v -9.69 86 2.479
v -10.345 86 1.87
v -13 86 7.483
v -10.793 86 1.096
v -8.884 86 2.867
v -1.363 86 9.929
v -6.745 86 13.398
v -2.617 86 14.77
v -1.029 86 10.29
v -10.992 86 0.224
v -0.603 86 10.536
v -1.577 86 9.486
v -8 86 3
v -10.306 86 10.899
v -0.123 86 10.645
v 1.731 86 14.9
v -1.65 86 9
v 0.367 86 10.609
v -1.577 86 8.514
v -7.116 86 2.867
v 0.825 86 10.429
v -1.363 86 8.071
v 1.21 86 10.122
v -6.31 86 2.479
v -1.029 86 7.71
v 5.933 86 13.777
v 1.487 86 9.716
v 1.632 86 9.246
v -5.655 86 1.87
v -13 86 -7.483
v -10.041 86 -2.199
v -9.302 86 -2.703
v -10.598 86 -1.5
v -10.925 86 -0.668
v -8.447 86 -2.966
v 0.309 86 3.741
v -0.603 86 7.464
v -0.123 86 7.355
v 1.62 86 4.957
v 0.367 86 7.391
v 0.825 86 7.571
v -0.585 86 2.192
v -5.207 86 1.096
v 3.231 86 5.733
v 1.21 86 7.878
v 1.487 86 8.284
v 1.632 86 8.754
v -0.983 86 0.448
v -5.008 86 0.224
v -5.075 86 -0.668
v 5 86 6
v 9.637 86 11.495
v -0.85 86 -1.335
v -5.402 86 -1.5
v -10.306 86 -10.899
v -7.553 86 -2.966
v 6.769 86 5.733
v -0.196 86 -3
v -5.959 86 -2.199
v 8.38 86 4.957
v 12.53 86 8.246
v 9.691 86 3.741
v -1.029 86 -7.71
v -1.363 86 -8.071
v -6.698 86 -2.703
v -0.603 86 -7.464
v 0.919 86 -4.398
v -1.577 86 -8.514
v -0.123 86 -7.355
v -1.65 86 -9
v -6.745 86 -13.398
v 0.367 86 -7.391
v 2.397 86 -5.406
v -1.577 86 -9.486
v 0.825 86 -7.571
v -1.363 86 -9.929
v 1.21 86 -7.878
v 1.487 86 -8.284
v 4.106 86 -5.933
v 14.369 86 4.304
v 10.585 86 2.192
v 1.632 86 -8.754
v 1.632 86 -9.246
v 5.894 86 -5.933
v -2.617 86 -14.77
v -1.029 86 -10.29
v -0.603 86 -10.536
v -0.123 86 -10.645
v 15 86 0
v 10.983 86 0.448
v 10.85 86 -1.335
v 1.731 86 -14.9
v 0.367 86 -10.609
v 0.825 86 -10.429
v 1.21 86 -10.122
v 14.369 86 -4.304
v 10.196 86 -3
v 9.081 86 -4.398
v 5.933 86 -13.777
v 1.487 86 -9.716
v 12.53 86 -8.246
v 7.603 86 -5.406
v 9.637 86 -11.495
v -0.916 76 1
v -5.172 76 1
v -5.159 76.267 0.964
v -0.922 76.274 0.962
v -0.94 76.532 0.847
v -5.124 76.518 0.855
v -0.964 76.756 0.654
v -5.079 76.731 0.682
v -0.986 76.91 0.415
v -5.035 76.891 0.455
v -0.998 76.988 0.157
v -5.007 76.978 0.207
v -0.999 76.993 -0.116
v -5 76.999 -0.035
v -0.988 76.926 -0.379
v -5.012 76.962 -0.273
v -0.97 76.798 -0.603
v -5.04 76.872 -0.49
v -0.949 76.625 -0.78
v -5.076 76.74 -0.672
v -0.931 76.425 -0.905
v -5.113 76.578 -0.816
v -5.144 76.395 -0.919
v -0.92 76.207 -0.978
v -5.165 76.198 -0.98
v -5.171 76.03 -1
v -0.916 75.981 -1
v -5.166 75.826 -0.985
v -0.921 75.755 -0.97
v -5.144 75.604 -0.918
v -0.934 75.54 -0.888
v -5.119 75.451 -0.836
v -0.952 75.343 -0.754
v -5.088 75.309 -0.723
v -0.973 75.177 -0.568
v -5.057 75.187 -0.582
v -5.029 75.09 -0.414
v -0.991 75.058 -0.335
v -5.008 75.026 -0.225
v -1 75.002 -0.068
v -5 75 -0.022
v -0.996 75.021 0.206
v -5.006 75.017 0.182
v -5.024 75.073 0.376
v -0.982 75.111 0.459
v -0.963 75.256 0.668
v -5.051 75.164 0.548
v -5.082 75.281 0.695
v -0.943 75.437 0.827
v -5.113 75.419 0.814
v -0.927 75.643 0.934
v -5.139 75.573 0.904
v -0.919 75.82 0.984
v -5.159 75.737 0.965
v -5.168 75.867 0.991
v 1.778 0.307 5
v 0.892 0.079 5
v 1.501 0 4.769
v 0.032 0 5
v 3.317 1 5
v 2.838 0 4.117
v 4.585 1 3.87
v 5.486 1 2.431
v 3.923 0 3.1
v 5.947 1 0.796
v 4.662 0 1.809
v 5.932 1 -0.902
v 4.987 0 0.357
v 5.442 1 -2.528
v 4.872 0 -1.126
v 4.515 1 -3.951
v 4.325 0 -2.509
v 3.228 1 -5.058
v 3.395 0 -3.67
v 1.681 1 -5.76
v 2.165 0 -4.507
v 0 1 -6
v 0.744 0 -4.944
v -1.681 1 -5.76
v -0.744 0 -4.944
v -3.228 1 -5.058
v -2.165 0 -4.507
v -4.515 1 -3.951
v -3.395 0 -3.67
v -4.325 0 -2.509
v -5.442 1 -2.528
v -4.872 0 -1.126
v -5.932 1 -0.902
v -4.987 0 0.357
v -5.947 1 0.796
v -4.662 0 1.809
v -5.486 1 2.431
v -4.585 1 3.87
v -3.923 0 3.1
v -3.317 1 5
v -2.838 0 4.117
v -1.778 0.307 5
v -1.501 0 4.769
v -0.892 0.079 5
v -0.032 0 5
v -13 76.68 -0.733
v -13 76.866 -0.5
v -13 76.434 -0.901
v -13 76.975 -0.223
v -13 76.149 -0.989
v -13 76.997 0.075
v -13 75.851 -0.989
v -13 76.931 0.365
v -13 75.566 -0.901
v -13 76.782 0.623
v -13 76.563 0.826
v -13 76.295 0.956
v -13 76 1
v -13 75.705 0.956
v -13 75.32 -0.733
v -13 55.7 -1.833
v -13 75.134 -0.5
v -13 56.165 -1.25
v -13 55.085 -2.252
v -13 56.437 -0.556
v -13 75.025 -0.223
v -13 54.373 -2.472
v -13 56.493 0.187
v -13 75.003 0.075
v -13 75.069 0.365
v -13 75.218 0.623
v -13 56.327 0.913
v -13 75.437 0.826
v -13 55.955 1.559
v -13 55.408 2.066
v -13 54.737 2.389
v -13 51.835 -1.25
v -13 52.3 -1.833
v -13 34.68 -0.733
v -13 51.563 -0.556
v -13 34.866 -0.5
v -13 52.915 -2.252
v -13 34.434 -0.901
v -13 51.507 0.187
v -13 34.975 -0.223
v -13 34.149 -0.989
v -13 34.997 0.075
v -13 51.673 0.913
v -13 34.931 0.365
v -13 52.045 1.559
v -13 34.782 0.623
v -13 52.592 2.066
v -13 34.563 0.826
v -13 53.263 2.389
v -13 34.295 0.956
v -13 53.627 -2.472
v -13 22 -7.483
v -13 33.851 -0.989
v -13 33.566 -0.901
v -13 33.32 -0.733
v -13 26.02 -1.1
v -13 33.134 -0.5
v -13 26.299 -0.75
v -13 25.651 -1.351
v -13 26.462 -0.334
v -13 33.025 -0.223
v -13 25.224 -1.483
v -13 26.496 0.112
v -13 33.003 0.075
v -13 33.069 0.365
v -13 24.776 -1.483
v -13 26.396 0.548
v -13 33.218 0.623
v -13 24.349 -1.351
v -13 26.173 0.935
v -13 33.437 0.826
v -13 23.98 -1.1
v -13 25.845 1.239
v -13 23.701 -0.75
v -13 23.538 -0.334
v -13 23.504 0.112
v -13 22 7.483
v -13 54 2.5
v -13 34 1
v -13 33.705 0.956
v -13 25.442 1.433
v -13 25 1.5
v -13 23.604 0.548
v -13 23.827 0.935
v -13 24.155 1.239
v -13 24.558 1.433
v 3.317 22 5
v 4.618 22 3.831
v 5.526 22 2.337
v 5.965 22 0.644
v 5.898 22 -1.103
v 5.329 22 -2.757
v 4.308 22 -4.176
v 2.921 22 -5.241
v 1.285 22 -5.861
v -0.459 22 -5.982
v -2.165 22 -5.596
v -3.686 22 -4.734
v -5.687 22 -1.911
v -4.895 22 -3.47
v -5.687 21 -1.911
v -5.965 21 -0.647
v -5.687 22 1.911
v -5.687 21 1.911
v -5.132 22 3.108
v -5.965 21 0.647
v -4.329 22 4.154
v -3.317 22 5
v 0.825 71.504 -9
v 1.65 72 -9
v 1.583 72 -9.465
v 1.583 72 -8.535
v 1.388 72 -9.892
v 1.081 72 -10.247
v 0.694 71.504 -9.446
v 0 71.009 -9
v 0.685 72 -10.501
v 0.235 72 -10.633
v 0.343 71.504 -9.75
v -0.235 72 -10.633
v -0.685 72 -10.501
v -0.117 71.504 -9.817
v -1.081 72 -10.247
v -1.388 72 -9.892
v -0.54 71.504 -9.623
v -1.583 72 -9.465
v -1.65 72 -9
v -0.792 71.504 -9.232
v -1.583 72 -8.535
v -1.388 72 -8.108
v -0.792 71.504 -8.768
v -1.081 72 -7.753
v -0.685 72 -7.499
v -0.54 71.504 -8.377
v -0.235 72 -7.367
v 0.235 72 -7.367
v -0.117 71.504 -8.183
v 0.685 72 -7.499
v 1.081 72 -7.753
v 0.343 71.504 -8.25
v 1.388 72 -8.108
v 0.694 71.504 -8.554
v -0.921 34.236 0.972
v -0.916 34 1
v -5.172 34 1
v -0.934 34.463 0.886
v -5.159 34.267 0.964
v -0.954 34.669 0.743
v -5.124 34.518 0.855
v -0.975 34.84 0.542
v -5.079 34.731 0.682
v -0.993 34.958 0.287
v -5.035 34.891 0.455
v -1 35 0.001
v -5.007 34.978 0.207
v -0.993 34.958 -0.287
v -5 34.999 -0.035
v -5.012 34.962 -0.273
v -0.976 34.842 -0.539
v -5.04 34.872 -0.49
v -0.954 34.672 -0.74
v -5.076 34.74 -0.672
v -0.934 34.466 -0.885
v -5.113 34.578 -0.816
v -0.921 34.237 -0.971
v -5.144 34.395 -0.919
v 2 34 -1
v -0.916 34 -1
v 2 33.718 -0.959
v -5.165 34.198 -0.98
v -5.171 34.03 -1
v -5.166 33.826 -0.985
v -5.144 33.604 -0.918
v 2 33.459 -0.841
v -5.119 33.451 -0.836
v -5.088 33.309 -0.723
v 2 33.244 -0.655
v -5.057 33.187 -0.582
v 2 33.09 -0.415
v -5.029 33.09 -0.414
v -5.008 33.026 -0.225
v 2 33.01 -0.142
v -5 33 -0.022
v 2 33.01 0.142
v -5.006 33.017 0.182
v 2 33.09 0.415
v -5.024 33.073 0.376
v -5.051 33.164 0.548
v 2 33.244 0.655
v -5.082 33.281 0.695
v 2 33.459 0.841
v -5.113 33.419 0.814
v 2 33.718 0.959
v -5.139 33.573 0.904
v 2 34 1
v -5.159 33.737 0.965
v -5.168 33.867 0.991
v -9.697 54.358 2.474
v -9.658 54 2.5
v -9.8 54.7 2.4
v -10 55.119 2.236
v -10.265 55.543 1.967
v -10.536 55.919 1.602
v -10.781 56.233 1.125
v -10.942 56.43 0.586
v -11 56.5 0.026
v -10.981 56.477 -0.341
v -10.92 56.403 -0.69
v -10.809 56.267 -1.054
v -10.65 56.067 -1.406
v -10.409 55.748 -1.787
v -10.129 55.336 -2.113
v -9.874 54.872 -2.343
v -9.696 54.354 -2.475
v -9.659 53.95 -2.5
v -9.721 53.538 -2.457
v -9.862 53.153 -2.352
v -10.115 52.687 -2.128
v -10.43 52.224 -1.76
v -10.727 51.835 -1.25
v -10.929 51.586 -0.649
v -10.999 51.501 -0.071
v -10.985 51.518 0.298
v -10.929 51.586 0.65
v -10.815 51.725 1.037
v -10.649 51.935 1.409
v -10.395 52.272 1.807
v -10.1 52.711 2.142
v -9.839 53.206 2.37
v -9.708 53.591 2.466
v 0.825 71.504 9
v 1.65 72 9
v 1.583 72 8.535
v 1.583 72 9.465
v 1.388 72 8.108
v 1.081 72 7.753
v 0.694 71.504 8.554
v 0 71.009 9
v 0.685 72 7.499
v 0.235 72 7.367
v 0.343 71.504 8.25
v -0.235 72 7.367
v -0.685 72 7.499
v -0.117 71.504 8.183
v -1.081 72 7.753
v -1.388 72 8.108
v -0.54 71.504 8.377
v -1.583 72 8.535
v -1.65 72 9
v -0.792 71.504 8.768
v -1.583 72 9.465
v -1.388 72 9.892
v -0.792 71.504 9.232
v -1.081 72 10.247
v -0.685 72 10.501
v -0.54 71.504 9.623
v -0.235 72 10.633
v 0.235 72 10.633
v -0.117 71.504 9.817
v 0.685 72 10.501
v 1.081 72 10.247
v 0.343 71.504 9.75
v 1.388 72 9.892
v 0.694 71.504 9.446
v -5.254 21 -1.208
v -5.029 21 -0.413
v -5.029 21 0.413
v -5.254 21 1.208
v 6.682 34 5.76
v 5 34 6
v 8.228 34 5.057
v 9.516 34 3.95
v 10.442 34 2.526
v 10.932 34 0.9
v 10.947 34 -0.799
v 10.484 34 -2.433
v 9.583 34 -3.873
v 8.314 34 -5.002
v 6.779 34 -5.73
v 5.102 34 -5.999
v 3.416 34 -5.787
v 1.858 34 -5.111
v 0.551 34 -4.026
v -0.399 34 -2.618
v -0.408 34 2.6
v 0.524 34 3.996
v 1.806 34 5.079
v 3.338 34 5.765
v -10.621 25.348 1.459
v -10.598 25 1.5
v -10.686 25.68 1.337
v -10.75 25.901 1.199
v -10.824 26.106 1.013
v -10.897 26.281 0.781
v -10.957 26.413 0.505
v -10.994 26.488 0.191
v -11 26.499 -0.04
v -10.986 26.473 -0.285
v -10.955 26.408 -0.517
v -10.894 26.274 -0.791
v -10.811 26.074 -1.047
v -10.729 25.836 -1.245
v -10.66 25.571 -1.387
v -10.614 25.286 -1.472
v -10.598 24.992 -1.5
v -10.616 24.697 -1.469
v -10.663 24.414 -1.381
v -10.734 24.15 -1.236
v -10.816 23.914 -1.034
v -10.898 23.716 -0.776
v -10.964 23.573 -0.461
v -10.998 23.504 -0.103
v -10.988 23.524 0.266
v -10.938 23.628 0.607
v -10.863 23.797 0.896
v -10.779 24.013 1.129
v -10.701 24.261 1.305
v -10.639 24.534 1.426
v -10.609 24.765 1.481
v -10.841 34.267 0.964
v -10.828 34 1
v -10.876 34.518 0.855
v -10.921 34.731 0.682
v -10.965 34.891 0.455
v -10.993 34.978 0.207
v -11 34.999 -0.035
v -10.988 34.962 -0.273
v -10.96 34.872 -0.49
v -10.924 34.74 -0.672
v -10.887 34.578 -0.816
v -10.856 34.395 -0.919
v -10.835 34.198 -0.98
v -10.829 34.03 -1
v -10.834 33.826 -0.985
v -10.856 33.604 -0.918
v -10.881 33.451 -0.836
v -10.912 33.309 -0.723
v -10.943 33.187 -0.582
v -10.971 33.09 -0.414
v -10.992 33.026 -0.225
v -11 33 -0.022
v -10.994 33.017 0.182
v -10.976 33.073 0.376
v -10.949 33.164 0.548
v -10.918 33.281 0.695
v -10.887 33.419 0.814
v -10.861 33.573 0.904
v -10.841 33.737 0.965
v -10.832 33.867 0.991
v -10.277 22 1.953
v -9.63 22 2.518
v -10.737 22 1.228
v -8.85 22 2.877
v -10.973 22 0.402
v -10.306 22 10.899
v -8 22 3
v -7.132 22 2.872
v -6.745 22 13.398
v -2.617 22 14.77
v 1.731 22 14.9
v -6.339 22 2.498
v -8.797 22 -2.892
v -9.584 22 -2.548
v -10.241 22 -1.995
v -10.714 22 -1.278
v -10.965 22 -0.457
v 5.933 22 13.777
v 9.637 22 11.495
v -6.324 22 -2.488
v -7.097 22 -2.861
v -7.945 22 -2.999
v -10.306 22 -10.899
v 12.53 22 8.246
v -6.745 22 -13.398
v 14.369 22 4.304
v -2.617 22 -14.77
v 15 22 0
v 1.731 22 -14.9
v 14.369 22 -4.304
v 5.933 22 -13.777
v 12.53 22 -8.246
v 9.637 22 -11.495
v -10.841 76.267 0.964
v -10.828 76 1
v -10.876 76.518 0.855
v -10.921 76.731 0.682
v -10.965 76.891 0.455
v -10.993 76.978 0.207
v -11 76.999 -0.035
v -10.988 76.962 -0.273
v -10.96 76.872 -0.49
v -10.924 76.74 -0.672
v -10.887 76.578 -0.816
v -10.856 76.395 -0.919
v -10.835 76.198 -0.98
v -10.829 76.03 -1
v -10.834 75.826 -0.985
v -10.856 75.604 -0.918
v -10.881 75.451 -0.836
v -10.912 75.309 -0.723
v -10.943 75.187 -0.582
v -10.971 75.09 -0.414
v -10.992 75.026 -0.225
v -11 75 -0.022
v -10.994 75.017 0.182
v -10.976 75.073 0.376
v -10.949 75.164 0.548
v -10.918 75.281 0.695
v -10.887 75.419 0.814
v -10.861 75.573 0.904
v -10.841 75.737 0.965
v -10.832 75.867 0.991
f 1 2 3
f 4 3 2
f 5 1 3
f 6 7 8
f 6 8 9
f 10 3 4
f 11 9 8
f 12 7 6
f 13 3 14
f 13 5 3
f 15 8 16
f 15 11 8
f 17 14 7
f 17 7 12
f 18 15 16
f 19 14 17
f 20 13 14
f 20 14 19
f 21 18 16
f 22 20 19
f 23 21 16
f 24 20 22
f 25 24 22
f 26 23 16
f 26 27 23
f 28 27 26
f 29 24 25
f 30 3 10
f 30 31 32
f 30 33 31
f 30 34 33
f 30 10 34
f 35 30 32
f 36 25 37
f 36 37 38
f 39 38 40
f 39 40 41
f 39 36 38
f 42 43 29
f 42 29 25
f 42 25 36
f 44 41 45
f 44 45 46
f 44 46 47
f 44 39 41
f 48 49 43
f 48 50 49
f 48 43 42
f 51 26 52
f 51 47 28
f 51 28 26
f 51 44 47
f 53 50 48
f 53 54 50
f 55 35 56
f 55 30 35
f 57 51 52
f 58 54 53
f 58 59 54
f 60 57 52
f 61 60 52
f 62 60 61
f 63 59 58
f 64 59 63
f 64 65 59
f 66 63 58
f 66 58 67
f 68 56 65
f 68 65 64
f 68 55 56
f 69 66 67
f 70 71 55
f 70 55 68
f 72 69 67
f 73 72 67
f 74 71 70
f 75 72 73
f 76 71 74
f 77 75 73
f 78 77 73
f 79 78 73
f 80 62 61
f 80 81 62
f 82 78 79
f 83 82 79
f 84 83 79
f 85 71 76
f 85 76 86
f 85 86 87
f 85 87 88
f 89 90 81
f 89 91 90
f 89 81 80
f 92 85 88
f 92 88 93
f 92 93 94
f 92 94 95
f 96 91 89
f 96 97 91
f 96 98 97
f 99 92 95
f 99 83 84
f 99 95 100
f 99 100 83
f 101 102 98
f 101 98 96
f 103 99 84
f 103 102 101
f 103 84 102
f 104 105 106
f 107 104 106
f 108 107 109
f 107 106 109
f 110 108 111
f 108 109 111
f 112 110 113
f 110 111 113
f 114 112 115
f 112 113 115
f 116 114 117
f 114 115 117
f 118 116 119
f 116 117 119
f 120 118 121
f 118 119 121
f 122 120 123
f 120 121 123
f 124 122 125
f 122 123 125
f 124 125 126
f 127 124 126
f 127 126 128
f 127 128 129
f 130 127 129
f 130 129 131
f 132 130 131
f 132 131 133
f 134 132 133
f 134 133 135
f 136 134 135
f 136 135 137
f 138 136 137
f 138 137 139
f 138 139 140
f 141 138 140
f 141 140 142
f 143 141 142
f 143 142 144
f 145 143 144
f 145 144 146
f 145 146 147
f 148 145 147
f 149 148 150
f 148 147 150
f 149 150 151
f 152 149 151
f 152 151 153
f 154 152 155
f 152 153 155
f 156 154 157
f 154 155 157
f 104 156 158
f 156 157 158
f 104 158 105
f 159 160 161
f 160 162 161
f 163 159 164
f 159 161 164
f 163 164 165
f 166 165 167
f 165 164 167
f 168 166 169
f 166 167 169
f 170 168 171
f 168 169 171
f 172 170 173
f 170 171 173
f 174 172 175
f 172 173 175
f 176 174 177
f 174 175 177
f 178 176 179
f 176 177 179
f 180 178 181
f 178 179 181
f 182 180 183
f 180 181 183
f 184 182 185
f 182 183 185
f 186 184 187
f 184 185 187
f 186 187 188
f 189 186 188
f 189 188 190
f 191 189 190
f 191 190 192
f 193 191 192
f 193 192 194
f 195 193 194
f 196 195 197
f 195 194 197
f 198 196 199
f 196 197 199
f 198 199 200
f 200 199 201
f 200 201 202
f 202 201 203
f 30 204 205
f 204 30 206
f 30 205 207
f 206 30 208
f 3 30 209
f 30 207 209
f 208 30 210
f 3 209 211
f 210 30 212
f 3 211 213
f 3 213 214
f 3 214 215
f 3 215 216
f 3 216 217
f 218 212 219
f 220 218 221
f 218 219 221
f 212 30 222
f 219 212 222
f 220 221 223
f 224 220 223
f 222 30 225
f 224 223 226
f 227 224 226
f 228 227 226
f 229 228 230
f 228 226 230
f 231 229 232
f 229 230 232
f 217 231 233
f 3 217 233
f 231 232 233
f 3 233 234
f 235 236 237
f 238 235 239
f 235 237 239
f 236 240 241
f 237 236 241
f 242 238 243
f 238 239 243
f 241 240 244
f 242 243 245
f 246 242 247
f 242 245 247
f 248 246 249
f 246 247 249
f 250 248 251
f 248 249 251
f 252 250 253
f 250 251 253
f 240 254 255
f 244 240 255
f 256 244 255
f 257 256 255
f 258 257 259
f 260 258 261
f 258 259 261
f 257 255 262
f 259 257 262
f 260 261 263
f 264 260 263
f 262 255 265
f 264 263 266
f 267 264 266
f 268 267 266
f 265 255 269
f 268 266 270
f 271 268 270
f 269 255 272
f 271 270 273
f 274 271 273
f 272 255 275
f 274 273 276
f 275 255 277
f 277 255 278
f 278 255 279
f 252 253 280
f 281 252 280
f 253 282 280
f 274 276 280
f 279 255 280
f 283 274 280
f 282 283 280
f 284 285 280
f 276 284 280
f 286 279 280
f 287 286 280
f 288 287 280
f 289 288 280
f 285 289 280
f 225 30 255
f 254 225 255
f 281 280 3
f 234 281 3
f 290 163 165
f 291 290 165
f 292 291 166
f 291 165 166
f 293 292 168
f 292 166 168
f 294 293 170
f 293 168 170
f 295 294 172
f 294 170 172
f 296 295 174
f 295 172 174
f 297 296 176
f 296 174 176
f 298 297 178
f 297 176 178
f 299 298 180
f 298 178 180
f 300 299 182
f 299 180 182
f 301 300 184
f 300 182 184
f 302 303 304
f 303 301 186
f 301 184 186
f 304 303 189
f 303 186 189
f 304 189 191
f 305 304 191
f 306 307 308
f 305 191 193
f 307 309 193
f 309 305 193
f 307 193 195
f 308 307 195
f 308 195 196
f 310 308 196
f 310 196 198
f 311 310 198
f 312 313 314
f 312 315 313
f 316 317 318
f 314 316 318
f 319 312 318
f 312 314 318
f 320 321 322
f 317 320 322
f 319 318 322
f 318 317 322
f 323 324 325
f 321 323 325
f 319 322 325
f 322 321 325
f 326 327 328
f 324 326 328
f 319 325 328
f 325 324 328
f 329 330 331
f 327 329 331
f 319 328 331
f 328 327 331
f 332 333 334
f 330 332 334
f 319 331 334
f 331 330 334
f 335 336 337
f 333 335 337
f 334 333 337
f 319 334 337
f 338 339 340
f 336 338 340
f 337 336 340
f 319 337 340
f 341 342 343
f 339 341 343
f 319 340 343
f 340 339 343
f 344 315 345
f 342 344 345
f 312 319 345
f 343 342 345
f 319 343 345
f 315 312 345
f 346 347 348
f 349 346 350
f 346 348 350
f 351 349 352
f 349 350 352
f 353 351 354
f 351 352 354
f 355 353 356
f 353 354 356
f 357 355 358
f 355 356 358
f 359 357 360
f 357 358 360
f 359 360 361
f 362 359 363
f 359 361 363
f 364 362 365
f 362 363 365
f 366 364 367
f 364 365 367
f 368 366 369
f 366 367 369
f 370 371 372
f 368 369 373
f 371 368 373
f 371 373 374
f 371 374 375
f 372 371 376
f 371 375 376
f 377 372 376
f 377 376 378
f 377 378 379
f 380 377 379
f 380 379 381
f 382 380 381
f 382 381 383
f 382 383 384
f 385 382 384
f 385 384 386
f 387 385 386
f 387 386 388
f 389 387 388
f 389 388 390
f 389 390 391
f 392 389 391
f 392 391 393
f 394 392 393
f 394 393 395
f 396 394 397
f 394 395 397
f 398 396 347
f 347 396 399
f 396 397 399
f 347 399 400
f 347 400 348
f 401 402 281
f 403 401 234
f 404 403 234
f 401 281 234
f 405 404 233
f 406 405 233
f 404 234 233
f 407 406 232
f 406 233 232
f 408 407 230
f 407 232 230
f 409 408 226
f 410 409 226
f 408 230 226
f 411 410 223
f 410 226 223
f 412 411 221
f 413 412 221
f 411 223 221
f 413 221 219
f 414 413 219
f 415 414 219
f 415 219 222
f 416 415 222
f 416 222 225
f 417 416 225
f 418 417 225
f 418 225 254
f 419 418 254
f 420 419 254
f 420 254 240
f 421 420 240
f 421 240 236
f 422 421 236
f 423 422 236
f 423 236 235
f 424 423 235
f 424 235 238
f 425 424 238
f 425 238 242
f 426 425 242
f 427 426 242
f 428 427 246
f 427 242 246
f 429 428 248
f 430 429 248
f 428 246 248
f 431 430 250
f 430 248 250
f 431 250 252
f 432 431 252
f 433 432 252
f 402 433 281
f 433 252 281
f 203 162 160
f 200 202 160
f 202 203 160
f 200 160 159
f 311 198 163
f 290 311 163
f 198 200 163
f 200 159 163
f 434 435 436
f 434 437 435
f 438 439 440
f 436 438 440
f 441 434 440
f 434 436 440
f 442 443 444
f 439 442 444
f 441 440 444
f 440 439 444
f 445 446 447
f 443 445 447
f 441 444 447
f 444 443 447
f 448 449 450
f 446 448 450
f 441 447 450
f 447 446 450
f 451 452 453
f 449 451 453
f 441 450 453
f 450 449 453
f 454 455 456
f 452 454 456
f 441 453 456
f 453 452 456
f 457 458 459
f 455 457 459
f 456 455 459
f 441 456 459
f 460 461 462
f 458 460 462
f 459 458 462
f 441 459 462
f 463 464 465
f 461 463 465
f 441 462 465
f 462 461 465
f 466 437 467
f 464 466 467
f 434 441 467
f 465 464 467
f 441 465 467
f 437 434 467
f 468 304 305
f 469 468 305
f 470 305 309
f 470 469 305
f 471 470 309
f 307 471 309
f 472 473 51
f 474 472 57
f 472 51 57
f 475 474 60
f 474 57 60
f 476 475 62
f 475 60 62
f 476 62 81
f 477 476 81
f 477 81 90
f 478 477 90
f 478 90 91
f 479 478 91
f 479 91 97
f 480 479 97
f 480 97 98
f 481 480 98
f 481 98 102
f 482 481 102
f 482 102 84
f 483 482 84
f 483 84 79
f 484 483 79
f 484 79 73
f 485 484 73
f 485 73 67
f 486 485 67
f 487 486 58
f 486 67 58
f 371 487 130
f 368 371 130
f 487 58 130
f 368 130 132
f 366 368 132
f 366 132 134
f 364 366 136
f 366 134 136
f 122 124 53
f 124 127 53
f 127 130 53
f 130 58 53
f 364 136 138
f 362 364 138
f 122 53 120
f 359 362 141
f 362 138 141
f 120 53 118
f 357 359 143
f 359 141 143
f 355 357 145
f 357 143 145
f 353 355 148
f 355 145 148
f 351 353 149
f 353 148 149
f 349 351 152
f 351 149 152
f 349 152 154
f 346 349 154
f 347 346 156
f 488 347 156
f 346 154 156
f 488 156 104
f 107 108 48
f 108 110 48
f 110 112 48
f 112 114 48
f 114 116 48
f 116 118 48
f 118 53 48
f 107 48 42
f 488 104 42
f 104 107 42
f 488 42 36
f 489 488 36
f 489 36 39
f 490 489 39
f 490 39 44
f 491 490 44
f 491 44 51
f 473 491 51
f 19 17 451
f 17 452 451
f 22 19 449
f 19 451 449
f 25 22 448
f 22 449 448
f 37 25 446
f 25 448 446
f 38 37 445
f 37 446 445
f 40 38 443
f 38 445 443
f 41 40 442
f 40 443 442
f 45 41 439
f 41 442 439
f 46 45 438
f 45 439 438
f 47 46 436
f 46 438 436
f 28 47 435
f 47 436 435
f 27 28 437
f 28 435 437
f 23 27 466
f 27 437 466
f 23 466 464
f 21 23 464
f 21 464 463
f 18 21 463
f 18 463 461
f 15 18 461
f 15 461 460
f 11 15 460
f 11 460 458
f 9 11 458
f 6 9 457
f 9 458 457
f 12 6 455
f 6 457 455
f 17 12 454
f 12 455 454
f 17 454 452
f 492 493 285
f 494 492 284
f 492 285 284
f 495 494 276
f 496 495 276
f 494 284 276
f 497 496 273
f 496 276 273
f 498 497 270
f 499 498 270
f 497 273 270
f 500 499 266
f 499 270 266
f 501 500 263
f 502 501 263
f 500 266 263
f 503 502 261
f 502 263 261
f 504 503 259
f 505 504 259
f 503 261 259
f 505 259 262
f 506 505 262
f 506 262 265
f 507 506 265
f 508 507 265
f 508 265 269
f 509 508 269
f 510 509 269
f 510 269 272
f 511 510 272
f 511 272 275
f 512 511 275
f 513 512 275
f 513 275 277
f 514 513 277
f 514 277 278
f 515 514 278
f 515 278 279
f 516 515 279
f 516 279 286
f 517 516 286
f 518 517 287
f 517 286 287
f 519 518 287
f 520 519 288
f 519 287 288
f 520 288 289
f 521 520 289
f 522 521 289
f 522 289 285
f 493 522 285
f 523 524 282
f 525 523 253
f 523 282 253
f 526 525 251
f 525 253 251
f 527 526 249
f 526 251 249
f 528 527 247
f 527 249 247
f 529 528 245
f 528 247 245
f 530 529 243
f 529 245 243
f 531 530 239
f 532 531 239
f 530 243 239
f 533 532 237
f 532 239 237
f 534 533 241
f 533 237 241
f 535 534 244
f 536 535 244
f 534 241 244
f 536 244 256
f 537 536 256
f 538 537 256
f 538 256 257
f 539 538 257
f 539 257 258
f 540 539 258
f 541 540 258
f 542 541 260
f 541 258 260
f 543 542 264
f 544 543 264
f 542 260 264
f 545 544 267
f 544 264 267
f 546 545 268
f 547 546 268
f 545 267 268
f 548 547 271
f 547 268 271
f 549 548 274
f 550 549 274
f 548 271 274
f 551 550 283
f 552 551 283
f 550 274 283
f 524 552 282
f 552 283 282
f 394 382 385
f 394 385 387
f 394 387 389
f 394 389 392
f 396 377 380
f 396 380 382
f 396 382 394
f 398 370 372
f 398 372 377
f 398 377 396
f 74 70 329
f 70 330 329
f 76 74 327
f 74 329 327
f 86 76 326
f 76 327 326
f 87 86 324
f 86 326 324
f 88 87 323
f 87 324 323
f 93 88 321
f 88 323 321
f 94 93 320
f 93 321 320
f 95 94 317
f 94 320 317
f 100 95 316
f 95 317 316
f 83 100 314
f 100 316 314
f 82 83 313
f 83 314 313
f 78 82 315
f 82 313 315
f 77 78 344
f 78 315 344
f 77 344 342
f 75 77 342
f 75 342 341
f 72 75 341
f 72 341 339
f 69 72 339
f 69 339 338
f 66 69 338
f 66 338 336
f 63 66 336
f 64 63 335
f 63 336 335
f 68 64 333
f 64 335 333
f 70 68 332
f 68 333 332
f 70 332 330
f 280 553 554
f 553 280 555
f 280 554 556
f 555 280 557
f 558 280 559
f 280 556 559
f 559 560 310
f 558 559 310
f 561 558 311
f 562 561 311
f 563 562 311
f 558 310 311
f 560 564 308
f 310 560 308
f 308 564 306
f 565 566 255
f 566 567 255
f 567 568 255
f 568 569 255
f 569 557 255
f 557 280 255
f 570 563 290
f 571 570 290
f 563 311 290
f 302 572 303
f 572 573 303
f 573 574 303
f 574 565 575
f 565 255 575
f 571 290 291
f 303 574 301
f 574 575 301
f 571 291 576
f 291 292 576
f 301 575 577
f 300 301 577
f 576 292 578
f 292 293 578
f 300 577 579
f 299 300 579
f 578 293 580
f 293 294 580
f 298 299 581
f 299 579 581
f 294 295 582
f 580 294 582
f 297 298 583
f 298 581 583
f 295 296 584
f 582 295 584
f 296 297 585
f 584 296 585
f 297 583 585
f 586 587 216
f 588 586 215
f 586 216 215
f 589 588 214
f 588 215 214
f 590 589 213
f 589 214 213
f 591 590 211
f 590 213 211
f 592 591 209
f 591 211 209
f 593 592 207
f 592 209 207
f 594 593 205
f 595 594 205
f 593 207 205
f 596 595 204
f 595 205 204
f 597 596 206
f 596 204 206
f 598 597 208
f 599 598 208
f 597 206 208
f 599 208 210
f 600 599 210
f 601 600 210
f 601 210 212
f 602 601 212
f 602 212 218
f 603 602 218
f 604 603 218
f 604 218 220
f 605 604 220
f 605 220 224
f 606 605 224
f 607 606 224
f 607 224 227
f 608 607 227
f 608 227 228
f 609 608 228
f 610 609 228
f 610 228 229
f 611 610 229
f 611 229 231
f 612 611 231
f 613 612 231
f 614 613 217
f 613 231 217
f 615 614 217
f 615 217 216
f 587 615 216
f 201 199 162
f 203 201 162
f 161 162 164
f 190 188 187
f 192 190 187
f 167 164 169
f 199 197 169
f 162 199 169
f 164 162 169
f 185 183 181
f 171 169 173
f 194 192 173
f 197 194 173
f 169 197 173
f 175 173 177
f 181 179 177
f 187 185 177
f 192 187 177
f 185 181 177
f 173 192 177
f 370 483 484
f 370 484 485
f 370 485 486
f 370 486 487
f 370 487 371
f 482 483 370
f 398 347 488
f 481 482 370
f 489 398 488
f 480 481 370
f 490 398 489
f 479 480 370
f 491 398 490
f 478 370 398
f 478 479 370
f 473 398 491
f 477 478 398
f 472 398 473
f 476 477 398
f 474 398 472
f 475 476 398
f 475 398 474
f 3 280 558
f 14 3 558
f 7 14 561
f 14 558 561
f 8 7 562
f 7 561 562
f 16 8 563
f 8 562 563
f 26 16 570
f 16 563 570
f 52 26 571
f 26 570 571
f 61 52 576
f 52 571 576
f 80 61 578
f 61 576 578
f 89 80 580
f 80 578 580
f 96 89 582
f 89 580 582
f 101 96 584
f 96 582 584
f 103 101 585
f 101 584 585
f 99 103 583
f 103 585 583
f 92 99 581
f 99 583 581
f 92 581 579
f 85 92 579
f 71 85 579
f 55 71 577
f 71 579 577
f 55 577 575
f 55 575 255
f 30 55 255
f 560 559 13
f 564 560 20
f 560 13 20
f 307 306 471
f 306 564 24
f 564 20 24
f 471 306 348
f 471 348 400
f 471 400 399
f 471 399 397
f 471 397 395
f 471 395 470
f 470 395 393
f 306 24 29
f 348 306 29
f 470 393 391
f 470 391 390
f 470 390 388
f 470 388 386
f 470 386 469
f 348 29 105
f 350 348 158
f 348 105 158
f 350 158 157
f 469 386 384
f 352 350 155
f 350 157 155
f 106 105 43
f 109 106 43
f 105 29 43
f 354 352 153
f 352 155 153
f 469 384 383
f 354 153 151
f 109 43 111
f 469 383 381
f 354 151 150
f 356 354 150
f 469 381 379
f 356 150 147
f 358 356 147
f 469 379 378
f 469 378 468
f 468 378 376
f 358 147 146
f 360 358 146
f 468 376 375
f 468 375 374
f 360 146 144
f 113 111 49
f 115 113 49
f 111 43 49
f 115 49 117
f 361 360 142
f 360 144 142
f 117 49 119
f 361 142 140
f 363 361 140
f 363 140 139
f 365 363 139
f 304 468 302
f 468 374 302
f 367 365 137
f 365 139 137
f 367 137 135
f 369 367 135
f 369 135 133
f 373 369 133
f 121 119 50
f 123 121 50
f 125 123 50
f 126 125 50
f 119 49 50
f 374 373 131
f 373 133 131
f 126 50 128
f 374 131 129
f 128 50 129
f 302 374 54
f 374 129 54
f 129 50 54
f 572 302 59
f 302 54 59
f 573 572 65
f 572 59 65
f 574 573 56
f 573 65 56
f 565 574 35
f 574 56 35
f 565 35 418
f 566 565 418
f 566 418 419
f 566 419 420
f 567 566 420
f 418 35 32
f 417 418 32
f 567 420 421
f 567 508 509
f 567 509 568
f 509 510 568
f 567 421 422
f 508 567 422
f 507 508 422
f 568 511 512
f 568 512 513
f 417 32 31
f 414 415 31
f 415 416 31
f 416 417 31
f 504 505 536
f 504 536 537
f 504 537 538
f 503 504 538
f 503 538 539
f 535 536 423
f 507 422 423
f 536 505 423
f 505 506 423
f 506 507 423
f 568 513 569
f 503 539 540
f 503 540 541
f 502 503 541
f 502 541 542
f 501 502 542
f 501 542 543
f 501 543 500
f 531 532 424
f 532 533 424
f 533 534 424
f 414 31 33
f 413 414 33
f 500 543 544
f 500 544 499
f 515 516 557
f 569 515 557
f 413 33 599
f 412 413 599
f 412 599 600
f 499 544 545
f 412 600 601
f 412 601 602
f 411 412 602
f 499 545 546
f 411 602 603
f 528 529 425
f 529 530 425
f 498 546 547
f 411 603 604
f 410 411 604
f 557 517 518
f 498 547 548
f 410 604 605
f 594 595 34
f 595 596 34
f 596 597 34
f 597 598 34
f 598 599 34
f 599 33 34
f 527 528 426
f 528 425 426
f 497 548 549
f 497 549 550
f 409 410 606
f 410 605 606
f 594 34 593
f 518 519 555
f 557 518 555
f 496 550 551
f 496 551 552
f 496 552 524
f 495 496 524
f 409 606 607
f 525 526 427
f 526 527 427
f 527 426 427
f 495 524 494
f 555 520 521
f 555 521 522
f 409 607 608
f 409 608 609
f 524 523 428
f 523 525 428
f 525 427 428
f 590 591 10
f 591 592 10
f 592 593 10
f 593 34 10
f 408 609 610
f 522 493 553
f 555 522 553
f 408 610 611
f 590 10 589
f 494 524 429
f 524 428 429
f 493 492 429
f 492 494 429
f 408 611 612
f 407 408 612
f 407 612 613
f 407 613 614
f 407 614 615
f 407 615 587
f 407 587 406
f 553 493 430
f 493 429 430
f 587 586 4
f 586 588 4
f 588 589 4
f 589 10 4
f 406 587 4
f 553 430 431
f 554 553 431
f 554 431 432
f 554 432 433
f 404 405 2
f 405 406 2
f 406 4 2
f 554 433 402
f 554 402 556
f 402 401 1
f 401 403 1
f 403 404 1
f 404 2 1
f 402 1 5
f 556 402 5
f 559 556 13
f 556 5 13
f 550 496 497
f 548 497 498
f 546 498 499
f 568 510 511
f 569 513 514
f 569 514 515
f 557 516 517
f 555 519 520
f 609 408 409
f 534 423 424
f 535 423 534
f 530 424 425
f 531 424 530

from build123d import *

# Parameters (mm, degrees)
BOSS_EXTRUDE2_DEPTH   = 22
BOSS_EXTRUDE3_DEPTH   = 64
SKETCH3_R             = 3
CUT_EXTRUDE1_DEPTH    = 65
SKETCH4_R             = 6
CUT_EXTRUDE2_DEPTH    = 52
M4_TAPPED_HOLE1_D     = 3.3
M4_TAPPED_HOLE1_DEPTH = 14
M4_TAPPED_HOLE1_TIP   = 0.991420021
SKETCH8_R             = 2.5
SKETCH8_R_2           = 1.5
CUT_EXTRUDE3_DEPTH    = 5
SKETCH9_R             = 1
CUT_EXTRUDE4_DEPTH    = 15
CHAMFER1_SIZE         = 1


with BuildPart() as part:
    # Sketch1 → Boss-Extrude2 (new body)
    with BuildSketch(Plane(origin=(0, 0, 0), x_dir=(1, 0, 0), z_dir=(0, 1, 0))):
        with BuildLine():
            Line((-3.31662479, -5), (3.31662479, -5))
            ThreePointArc((3.31662479, -5), (0, 6), (-3.31662479, -5))
        make_face()
    extrude(amount=BOSS_EXTRUDE2_DEPTH)

    # Sketch2 → Boss-Extrude3 (add)
    with BuildSketch(Plane(origin=(0, 22, 0), x_dir=(1, 0, 0), z_dir=(0, 1, 0))):
        with BuildLine():
            Line((-13, 7.483314774), (-13, -7.483314774))
            ThreePointArc((-13, -7.483314774), (15, 0), (-13, 7.483314774))
        make_face()
    extrude(amount=BOSS_EXTRUDE3_DEPTH)

    # Sketch3 → Cut-Extrude1 (cut)
    with BuildSketch(Plane(origin=(0, 86, 0), x_dir=(1, 0, 0), z_dir=(0, 1, 0))):
        with Locations(Location((-8, 0, 0), (0, 0, 270))):
            Circle(SKETCH3_R)
    extrude(amount=-CUT_EXTRUDE1_DEPTH, mode=Mode.SUBTRACT)

    # Sketch4 → Cut-Extrude2 (cut)
    with BuildSketch(Plane(origin=(0, 86, 0), x_dir=(1, 0, 0), z_dir=(0, 1, 0))):
        with Locations(Location((5, 0, 0), (0, 0, 270))):
            Circle(SKETCH4_R)
    extrude(amount=-CUT_EXTRUDE2_DEPTH, mode=Mode.SUBTRACT)

    # M4 Tapped Hole1
    with Locations(Plane(origin=(0, 86, 0), x_dir=(1, 0, 0), z_dir=(0, 1, 0))):
        with Locations((0, -9), (0, 9)):
            Hole(M4_TAPPED_HOLE1_D / 2, depth=M4_TAPPED_HOLE1_DEPTH)
            with Locations((0, 0, -(M4_TAPPED_HOLE1_DEPTH + M4_TAPPED_HOLE1_TIP / 2))):  # 118° drill point
                Cone(0, M4_TAPPED_HOLE1_D / 2, M4_TAPPED_HOLE1_TIP, mode=Mode.SUBTRACT)

    # Sketch8 → Cut-Extrude3 (cut)
    with BuildSketch(Plane.ZY.offset(13)):
        with Locations((0, 54)):
            Circle(SKETCH8_R)
        with Locations((0, 25)):
            Circle(SKETCH8_R_2)
    extrude(amount=-CUT_EXTRUDE3_DEPTH, mode=Mode.SUBTRACT)

    # Sketch9 → Cut-Extrude4 (cut)
    with BuildSketch(Plane.ZY.offset(13)):
        with Locations((0, 76)):
            Circle(SKETCH9_R)
        with Locations((0, 34)):
            Circle(SKETCH9_R)
    extrude(amount=-CUT_EXTRUDE4_DEPTH, mode=Mode.SUBTRACT)

    # Chamfer1
    chamfer1_edges = [part.edges().sort_by_distance(p)[0] for p in [
        (0, 0, -6),
    ]]
    chamfer(chamfer1_edges, length=CHAMFER1_SIZE - 0.0001)  # a hair under: the kernel refuses the full size


solid = part.part
